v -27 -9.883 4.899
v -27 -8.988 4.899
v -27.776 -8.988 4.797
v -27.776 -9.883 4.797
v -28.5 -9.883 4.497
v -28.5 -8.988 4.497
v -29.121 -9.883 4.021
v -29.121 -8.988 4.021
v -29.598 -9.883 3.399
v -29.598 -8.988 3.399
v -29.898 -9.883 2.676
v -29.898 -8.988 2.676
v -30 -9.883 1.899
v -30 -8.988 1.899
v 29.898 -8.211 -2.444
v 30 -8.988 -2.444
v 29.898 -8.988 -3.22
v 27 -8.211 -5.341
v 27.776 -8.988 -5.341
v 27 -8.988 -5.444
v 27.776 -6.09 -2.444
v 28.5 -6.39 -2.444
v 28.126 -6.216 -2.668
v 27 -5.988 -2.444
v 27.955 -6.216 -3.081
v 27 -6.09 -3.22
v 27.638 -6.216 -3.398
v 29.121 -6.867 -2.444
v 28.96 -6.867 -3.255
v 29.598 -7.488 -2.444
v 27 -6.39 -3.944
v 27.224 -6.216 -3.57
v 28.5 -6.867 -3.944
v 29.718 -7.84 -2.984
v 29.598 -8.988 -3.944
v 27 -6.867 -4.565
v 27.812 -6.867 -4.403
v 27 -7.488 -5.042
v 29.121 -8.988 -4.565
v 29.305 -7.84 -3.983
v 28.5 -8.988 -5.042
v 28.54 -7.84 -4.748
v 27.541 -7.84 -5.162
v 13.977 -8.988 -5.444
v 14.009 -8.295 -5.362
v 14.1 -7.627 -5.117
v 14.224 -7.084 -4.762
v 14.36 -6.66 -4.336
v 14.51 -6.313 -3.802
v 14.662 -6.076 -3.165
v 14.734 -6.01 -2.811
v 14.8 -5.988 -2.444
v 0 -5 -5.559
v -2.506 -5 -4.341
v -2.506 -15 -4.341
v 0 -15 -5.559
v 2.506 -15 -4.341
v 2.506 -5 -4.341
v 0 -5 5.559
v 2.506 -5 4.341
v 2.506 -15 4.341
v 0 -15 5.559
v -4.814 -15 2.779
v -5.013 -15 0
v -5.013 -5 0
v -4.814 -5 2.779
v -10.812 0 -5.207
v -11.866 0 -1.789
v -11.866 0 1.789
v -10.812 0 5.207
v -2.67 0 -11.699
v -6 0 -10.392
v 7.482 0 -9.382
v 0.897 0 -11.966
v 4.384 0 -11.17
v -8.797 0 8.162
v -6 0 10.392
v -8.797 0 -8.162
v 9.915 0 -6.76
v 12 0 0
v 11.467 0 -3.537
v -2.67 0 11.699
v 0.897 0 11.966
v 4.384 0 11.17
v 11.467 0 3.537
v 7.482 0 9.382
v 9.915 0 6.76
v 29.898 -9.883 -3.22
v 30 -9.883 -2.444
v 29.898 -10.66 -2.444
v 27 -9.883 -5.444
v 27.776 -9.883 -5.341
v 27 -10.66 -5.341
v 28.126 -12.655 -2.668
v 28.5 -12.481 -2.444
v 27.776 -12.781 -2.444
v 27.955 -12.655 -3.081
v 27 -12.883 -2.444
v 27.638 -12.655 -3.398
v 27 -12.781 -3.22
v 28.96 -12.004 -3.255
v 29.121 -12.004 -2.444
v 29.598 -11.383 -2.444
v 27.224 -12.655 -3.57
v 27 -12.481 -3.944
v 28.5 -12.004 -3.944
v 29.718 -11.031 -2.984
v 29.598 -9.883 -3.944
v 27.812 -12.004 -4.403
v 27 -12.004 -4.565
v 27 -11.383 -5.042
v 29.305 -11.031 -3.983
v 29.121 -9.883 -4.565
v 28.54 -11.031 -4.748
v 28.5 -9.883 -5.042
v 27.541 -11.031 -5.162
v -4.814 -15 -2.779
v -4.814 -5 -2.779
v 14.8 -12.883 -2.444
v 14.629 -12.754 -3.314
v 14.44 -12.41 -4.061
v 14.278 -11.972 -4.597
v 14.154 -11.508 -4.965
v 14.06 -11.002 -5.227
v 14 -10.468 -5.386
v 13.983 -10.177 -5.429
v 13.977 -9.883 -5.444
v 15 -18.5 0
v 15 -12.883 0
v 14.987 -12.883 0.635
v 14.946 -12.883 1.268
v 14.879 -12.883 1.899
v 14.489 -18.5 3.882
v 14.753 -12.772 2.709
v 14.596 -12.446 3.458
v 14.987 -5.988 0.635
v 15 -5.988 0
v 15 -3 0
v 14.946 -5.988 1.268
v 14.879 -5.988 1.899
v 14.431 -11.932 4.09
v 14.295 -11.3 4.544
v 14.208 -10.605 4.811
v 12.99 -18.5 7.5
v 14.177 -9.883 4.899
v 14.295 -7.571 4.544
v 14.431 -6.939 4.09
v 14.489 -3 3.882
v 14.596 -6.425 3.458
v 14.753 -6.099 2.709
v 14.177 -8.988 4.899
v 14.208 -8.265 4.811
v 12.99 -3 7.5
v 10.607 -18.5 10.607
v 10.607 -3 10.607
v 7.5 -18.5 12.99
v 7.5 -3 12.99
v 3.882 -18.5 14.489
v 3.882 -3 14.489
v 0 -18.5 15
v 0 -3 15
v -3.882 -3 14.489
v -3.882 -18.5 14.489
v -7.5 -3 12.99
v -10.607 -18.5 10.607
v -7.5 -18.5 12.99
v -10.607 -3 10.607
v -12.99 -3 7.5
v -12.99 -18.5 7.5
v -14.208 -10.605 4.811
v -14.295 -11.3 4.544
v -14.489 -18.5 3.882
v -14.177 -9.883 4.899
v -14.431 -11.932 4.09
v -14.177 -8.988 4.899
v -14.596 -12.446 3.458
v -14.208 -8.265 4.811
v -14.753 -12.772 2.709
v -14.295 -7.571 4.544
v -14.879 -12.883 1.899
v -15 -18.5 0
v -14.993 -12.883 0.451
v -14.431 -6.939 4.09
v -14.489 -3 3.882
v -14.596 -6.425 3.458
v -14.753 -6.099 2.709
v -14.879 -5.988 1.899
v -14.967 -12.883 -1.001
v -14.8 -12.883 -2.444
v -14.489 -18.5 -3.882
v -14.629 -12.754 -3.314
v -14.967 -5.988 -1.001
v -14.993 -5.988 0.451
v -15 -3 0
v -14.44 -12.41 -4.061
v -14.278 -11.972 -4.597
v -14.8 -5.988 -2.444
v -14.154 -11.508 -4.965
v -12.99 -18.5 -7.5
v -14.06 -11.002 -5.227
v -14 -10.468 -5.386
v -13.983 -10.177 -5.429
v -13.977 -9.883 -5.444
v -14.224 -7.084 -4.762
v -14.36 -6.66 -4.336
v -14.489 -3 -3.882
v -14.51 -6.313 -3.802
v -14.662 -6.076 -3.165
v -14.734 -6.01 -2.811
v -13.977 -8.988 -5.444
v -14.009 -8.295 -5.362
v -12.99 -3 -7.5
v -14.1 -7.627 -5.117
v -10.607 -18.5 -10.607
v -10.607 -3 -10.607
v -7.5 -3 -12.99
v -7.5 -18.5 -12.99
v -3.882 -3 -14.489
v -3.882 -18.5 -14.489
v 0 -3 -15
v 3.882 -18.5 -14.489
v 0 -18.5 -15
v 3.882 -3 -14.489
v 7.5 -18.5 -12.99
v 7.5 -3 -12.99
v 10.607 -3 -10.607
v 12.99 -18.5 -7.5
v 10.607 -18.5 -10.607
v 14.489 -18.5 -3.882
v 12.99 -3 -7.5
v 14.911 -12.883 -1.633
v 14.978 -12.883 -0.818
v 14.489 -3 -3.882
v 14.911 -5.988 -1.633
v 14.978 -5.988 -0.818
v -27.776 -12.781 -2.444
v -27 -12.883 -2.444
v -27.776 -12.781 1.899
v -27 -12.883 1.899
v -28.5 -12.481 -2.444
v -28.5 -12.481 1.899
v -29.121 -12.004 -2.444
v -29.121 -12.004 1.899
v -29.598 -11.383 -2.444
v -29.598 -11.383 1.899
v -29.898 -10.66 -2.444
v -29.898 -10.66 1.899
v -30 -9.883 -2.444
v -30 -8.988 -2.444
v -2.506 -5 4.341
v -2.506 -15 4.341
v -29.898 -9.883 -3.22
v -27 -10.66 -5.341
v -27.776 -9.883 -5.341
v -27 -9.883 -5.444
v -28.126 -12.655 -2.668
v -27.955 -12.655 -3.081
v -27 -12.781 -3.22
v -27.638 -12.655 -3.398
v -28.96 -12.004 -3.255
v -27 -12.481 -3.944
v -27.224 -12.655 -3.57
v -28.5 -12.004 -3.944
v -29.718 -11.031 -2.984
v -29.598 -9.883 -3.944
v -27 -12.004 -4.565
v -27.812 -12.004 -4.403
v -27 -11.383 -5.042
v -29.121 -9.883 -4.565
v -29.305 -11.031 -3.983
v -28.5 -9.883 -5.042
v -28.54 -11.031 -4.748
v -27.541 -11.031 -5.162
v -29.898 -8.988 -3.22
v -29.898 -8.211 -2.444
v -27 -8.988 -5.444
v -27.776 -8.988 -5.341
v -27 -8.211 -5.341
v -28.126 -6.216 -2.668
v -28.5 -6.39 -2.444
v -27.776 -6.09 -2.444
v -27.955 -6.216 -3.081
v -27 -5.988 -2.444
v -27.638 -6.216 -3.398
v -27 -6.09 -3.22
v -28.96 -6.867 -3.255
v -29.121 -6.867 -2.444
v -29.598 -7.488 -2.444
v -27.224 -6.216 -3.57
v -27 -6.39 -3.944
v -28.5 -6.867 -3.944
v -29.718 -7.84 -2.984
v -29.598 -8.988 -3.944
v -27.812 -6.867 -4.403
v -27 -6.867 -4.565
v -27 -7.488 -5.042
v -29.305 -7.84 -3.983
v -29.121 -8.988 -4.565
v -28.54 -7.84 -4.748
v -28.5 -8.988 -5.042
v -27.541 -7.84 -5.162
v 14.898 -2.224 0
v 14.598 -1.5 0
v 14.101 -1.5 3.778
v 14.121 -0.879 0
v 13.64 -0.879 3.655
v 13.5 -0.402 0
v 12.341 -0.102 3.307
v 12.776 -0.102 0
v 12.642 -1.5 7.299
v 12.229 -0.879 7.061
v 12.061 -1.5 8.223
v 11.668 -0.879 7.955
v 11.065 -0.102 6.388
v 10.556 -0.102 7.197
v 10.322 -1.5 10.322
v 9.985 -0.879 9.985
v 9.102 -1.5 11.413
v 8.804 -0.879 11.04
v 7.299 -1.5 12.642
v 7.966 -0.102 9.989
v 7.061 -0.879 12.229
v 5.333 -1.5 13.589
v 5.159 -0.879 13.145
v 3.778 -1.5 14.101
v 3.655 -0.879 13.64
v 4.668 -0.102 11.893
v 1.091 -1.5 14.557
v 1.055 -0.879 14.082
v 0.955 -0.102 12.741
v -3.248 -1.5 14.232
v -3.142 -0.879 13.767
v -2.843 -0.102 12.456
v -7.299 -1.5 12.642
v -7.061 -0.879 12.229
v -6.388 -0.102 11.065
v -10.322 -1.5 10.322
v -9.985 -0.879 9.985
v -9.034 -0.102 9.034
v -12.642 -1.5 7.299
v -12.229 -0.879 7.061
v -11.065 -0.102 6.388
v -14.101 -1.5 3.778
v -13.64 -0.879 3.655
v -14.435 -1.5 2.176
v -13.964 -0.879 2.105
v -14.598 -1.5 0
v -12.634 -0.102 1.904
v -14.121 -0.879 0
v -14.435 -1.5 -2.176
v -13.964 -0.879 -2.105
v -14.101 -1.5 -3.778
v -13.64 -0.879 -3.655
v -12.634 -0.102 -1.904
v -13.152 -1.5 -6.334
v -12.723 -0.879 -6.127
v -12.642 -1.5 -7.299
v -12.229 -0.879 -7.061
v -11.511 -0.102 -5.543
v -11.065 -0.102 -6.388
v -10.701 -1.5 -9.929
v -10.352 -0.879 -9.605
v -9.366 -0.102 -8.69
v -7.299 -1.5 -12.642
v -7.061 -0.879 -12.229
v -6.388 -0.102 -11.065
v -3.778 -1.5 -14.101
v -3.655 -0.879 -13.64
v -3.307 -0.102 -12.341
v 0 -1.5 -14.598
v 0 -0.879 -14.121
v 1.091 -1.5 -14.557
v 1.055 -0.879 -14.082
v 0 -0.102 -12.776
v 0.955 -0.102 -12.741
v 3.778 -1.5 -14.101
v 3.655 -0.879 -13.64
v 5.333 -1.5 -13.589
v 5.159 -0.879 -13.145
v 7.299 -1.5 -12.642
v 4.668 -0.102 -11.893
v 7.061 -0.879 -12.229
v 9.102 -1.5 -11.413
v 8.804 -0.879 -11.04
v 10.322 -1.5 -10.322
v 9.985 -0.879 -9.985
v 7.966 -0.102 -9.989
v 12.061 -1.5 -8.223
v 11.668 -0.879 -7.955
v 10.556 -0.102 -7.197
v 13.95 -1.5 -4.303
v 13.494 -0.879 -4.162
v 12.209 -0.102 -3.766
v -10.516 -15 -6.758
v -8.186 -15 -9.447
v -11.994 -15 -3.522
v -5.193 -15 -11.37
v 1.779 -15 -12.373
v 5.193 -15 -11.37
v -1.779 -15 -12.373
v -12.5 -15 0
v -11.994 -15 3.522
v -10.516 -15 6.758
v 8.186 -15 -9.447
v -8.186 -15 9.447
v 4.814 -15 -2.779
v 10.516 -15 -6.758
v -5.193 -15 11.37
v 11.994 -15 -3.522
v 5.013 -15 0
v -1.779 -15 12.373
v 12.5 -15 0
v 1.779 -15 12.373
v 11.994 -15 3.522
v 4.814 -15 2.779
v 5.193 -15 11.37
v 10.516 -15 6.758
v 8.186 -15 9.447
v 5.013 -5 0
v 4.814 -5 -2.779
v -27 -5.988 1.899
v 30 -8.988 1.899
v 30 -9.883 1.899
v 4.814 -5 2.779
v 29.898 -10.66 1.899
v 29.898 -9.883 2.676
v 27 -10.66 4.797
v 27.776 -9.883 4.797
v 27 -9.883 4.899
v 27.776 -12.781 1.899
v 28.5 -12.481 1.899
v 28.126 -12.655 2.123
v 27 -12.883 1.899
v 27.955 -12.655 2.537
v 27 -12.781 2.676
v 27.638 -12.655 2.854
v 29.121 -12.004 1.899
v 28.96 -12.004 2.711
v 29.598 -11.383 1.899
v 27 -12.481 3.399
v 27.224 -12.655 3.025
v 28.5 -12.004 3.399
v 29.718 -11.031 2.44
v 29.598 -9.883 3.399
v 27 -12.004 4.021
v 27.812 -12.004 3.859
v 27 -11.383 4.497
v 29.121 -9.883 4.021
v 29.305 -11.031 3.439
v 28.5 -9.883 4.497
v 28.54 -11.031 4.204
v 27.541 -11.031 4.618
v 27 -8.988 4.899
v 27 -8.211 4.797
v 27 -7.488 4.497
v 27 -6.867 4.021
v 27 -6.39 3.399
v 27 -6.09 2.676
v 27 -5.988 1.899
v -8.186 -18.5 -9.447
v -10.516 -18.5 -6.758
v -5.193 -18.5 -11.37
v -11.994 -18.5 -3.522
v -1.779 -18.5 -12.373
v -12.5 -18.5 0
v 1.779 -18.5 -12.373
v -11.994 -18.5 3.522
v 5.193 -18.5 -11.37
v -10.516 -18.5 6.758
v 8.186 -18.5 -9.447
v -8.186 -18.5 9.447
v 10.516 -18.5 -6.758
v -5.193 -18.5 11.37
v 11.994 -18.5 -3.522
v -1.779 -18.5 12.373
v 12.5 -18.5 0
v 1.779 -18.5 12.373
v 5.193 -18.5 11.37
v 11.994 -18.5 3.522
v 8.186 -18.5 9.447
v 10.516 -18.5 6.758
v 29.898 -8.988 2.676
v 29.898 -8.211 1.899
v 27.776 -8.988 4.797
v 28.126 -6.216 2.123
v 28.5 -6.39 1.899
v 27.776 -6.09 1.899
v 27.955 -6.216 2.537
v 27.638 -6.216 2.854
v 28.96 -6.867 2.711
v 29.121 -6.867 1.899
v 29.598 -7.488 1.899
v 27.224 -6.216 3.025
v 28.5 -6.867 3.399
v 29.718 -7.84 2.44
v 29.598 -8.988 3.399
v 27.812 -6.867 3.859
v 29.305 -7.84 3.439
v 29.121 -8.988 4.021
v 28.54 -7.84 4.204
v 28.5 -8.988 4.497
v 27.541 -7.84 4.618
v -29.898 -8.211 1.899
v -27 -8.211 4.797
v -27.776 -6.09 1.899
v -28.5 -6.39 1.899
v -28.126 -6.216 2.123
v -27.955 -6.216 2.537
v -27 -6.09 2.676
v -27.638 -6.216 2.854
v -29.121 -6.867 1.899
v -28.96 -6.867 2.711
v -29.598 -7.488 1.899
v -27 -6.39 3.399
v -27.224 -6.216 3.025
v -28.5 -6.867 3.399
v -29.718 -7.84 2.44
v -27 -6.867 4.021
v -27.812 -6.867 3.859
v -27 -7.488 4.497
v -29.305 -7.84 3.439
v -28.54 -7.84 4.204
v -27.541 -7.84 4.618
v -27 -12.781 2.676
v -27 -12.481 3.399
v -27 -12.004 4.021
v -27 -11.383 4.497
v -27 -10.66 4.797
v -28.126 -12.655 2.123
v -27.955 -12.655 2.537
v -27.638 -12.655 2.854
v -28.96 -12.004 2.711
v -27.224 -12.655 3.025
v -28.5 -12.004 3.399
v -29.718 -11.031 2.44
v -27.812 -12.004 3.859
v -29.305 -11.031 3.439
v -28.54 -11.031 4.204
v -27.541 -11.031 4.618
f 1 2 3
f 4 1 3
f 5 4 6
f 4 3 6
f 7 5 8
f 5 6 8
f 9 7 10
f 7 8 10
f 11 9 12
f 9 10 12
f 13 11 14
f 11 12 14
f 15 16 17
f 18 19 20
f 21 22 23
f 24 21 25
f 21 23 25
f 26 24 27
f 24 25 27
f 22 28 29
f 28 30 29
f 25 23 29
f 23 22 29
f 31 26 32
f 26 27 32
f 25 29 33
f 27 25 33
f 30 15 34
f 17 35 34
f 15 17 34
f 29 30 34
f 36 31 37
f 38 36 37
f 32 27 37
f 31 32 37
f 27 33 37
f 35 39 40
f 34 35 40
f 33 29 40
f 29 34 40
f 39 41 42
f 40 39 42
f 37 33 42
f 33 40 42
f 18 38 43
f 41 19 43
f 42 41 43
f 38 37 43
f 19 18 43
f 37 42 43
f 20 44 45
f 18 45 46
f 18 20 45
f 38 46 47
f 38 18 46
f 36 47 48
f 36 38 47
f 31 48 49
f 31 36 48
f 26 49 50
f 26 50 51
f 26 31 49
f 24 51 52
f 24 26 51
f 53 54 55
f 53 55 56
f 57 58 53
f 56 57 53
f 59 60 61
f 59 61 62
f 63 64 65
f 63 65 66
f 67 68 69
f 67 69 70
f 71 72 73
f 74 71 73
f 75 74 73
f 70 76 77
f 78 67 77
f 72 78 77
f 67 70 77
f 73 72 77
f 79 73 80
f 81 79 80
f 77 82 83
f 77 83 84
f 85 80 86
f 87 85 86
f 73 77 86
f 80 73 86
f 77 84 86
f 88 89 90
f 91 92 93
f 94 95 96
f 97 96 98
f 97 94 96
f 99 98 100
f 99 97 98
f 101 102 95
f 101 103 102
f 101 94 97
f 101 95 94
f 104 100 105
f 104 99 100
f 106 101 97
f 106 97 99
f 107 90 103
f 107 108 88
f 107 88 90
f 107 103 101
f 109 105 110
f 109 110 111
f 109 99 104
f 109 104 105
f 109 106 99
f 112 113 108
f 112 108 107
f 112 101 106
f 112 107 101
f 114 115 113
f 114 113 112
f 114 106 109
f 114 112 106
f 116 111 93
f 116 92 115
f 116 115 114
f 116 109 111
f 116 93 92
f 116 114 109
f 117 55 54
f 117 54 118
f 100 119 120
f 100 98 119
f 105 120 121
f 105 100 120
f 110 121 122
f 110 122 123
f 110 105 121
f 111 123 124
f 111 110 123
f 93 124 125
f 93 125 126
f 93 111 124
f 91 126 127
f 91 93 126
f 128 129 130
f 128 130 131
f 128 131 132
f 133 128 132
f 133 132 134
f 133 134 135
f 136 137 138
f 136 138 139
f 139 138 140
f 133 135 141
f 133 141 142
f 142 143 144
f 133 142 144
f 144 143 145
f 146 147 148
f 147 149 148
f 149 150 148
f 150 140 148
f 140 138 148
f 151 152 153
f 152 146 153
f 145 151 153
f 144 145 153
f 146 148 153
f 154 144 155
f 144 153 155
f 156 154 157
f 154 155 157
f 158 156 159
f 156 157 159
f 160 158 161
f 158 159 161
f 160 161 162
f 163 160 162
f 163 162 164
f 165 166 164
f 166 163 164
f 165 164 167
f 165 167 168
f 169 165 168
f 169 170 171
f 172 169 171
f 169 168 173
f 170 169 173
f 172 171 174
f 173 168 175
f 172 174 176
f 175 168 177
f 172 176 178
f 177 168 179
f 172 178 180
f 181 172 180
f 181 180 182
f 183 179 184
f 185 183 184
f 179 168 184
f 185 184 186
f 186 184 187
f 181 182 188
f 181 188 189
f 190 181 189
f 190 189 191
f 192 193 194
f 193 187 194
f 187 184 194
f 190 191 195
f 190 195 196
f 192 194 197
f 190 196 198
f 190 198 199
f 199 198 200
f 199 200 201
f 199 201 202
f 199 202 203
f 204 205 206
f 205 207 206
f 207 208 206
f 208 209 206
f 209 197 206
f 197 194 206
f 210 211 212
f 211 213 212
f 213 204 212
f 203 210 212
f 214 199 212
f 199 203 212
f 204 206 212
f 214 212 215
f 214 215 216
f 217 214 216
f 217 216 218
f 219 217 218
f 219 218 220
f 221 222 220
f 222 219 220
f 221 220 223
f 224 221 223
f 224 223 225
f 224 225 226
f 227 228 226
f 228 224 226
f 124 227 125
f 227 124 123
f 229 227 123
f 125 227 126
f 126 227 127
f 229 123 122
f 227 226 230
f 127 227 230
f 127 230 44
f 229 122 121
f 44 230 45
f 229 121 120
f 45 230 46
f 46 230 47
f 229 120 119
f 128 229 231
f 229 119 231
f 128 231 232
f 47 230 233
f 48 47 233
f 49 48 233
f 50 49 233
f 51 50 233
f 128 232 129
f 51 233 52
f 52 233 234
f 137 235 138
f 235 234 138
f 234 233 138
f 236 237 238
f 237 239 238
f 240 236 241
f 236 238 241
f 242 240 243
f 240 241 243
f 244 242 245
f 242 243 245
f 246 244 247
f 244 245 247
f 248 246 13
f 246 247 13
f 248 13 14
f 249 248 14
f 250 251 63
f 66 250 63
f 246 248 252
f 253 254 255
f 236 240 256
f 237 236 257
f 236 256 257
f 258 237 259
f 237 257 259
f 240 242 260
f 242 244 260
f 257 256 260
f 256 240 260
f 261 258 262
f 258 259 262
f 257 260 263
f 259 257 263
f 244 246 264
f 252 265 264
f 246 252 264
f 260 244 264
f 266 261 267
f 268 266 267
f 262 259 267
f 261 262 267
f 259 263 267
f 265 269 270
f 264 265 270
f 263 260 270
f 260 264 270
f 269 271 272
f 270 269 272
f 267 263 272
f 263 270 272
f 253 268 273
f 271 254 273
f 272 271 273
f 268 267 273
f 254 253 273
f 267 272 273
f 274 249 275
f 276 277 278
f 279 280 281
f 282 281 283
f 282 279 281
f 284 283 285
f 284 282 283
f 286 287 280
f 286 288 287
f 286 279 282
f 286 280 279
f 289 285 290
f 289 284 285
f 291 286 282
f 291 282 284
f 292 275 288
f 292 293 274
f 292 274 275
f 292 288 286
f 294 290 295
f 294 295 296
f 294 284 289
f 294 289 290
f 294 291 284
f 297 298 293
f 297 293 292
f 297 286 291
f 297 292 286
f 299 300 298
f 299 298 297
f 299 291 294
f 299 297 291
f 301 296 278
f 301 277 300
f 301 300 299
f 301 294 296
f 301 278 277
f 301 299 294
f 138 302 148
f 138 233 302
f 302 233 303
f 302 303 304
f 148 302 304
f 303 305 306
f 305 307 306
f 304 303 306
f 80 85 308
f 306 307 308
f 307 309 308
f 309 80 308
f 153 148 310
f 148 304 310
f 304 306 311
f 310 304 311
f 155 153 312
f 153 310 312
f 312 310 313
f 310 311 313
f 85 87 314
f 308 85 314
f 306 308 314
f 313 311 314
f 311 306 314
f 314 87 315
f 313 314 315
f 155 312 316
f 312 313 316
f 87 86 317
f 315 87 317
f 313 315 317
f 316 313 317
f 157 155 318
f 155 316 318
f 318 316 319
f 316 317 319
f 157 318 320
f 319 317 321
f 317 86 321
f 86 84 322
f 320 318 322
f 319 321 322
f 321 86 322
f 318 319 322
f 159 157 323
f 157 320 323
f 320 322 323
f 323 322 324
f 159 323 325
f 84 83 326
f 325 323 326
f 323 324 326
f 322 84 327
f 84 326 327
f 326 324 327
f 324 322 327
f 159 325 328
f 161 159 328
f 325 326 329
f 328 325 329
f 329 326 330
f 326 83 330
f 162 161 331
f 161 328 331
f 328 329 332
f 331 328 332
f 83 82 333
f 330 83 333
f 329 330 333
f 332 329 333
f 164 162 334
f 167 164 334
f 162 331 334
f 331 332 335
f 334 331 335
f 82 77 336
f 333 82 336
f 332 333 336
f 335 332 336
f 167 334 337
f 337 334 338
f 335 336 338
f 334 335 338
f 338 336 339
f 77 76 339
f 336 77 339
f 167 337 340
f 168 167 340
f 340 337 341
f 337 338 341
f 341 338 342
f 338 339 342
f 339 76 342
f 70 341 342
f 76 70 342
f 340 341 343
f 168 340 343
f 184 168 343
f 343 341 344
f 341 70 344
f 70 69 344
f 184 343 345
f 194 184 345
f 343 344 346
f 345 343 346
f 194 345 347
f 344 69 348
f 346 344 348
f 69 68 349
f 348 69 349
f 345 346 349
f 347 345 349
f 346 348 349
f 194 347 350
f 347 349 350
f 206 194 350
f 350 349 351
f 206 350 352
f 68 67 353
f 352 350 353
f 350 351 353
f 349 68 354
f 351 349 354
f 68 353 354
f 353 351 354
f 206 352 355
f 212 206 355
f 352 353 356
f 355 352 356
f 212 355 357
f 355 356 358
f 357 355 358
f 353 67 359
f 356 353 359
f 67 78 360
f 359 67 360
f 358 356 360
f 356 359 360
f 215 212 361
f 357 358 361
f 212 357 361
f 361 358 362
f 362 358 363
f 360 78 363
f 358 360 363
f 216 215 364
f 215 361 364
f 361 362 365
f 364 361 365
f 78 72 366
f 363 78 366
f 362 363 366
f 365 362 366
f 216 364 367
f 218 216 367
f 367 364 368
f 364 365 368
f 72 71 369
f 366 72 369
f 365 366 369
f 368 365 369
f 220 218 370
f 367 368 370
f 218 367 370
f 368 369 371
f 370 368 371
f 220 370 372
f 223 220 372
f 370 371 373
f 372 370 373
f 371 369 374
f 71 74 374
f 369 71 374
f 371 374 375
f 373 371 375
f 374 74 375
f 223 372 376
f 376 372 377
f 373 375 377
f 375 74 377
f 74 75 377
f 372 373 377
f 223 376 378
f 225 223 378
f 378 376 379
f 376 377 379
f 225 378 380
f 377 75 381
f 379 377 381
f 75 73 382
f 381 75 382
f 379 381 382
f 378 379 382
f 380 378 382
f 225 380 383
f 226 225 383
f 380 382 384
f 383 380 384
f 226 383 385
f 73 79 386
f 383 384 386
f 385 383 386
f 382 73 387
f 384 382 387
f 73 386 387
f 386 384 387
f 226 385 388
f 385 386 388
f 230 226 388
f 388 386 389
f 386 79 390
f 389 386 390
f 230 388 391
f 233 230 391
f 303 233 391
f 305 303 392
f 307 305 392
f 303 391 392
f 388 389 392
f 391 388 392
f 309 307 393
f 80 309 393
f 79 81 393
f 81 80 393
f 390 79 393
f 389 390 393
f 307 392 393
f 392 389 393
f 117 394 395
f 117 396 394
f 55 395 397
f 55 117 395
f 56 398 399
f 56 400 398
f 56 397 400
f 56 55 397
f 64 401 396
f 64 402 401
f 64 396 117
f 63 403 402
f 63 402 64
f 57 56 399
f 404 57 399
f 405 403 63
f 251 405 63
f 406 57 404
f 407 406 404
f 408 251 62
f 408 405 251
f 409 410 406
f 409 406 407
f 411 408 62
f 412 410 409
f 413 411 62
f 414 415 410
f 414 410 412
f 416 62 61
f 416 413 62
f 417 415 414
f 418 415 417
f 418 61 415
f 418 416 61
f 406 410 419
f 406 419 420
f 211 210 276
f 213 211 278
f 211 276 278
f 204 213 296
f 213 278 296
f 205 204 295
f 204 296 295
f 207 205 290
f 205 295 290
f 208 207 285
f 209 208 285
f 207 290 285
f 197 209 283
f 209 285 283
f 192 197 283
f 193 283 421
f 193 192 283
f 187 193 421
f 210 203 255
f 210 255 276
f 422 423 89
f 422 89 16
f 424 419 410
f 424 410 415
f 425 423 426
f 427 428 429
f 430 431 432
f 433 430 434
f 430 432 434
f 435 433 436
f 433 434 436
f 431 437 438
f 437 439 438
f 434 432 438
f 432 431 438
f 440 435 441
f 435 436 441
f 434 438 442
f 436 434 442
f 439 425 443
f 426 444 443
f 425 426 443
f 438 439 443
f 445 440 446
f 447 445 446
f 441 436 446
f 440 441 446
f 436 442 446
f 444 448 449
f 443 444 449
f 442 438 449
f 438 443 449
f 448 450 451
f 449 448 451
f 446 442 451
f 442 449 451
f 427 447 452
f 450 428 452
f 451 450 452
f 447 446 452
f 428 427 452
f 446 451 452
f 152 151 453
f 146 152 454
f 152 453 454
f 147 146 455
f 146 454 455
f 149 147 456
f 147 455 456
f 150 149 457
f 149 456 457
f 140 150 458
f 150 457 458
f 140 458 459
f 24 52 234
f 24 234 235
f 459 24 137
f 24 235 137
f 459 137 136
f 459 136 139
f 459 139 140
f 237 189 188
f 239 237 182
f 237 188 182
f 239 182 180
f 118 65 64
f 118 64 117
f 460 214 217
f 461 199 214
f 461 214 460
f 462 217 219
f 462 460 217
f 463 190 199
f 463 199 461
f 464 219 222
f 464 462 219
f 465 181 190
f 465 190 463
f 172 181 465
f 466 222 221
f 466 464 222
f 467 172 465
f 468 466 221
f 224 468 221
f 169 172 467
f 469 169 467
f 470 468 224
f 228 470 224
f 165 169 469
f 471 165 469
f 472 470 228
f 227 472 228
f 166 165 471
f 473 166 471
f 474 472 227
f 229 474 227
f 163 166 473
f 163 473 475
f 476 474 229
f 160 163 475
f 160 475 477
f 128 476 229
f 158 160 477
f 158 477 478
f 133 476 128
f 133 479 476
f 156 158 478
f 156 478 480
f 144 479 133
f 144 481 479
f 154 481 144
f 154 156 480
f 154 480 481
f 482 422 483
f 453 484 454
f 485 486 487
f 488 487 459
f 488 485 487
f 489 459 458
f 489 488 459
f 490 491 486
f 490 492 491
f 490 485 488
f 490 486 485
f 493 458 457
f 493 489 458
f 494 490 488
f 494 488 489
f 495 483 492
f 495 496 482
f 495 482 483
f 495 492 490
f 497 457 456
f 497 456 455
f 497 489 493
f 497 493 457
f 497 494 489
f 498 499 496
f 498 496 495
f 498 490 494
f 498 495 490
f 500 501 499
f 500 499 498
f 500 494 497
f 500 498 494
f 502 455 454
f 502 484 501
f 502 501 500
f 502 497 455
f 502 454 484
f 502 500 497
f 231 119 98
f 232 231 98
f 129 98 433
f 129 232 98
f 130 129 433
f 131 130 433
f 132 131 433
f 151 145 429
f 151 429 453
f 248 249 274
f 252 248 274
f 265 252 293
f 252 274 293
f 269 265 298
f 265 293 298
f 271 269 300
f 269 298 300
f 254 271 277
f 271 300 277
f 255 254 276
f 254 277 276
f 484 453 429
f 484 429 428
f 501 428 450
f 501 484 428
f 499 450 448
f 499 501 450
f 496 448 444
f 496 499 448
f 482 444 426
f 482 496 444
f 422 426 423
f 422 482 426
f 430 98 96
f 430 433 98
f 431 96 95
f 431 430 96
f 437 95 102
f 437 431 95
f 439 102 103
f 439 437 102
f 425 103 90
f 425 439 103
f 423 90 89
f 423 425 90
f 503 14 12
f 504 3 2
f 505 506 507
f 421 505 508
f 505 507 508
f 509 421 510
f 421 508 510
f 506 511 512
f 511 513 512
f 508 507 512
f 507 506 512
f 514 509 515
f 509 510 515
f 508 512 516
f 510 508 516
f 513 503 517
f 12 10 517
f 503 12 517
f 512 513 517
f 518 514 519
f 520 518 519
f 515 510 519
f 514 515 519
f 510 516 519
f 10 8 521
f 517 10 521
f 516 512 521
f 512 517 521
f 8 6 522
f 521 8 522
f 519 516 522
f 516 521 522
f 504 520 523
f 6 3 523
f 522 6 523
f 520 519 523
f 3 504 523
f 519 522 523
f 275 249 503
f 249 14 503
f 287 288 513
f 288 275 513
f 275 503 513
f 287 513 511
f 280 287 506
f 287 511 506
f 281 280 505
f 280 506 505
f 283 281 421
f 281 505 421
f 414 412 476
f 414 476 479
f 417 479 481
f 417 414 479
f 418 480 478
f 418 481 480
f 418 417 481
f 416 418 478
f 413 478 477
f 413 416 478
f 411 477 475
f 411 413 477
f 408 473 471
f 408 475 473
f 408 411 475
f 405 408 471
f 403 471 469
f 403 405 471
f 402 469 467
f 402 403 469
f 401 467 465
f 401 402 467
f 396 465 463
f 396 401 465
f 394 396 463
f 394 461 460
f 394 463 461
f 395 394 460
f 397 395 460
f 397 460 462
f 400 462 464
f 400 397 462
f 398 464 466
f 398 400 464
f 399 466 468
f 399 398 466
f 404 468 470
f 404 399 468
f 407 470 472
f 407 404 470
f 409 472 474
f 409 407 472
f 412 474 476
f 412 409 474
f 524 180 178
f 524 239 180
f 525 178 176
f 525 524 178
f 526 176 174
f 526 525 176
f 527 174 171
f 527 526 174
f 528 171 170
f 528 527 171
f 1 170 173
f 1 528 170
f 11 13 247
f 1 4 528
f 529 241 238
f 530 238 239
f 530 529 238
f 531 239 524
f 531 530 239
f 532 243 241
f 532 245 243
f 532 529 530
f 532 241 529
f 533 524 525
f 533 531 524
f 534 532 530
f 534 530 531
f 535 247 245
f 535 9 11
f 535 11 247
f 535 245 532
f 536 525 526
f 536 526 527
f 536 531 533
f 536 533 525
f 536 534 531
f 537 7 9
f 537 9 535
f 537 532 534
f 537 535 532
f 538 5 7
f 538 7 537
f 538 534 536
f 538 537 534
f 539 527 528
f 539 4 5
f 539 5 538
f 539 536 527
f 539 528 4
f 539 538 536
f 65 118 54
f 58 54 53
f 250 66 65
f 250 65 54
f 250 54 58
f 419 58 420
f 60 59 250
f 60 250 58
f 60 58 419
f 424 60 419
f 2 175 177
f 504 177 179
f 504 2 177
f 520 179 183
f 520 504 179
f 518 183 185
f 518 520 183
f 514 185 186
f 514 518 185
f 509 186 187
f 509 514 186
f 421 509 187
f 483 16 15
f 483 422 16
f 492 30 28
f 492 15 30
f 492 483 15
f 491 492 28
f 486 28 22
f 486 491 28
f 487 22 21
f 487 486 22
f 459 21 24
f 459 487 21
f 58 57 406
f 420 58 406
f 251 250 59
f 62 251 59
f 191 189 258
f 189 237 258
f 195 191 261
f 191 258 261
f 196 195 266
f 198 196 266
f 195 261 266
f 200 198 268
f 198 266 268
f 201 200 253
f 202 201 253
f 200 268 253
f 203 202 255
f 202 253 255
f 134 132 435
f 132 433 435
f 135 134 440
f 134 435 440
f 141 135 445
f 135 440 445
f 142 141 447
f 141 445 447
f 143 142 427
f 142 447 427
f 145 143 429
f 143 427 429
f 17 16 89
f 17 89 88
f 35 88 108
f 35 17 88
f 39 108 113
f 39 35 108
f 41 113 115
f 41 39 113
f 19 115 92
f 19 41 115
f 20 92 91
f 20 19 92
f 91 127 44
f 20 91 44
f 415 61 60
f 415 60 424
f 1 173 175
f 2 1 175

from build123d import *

# Parameters (mm, degrees)
F0_R      = 15
F1_DEPTH  = 18.5
F2_T      = -2.5
F3_R      = 12.5
F4_DEPTH  = 12.5
F6_DEPTH  = 10
F8_W      = 6.8951621652
F8_H      = 10.3427423164
F9_DEPTH  = 3
F10_W     = 6.8951621652
F10_H     = 10.3427423164
F11_DEPTH = 18
F12_R     = 3


with BuildPart() as f1:
    # F0 (on Front) → F1 (new body)
    with BuildSketch(Plane.XZ):
        Circle(F0_R)
    extrude(amount=F1_DEPTH)

    # F2
    f2_openings = [f1.faces().sort_by_distance(p)[0] for p in [
        (0, -18.5, 0),
    ]]
    offset(amount=F2_T, openings=f2_openings)

    # F3 (on face) → F4 (join)
    with BuildSketch(Plane.XZ.offset(2.5)):
        Circle(F3_R)
    extrude(amount=F4_DEPTH)

    # F5 (on face) → F6 (cut)
    with BuildSketch(Plane.XZ.offset(15)):
        Polygon((4.7811761408, 3.2363077795), (-0.4121366812, 5.7587738877), (-5.193312822, 2.5224661081), (-4.7811761408, -3.2363077795), (0.4121366812, -5.7587738877), (5.193312822, -2.5224661081), align=None)
    extrude(amount=-F6_DEPTH, mode=Mode.SUBTRACT)

    # F8 (on offset) → F9 (cut)
    with BuildSketch(Plane.YZ.offset(15)):
        with Locations((-9.4354841858, -0.2721771598)):
            Rectangle(F8_W, F8_H)
    extrude(amount=-F9_DEPTH, mode=Mode.SUBTRACT)

    # F10 (on face) → F11 (join)
    with BuildSketch(Plane.YZ.offset(12)):
        with Locations((-9.4354841858, -0.2721771598)):
            Rectangle(F10_W, F10_H)
    extrude(amount=F11_DEPTH)

    # F12
    f12_edges = [f1.edges().sort_by_distance(p)[0] for p in [
        (30, -9.435484, 4.899194),
        (30, -9.435484, -5.443548),
        (30, -5.987903, -0.272177),
        (30, -12.883065, -0.272177),
        (22.088686, -12.883065, 4.899194),
        (21.988701, -12.883065, -5.443548),
        (22.088686, -5.987903, 4.899194),
        (21.988701, -5.987903, -5.443548),
        (-15, 0, 0),
    ]]
    fillet(f12_edges, radius=F12_R)

    # F13: F1 across plane


with BuildPart() as f1_1:
    add(f1.part)
    add(f1.part.mirror(Plane.YZ))


solid = f1_1.part
